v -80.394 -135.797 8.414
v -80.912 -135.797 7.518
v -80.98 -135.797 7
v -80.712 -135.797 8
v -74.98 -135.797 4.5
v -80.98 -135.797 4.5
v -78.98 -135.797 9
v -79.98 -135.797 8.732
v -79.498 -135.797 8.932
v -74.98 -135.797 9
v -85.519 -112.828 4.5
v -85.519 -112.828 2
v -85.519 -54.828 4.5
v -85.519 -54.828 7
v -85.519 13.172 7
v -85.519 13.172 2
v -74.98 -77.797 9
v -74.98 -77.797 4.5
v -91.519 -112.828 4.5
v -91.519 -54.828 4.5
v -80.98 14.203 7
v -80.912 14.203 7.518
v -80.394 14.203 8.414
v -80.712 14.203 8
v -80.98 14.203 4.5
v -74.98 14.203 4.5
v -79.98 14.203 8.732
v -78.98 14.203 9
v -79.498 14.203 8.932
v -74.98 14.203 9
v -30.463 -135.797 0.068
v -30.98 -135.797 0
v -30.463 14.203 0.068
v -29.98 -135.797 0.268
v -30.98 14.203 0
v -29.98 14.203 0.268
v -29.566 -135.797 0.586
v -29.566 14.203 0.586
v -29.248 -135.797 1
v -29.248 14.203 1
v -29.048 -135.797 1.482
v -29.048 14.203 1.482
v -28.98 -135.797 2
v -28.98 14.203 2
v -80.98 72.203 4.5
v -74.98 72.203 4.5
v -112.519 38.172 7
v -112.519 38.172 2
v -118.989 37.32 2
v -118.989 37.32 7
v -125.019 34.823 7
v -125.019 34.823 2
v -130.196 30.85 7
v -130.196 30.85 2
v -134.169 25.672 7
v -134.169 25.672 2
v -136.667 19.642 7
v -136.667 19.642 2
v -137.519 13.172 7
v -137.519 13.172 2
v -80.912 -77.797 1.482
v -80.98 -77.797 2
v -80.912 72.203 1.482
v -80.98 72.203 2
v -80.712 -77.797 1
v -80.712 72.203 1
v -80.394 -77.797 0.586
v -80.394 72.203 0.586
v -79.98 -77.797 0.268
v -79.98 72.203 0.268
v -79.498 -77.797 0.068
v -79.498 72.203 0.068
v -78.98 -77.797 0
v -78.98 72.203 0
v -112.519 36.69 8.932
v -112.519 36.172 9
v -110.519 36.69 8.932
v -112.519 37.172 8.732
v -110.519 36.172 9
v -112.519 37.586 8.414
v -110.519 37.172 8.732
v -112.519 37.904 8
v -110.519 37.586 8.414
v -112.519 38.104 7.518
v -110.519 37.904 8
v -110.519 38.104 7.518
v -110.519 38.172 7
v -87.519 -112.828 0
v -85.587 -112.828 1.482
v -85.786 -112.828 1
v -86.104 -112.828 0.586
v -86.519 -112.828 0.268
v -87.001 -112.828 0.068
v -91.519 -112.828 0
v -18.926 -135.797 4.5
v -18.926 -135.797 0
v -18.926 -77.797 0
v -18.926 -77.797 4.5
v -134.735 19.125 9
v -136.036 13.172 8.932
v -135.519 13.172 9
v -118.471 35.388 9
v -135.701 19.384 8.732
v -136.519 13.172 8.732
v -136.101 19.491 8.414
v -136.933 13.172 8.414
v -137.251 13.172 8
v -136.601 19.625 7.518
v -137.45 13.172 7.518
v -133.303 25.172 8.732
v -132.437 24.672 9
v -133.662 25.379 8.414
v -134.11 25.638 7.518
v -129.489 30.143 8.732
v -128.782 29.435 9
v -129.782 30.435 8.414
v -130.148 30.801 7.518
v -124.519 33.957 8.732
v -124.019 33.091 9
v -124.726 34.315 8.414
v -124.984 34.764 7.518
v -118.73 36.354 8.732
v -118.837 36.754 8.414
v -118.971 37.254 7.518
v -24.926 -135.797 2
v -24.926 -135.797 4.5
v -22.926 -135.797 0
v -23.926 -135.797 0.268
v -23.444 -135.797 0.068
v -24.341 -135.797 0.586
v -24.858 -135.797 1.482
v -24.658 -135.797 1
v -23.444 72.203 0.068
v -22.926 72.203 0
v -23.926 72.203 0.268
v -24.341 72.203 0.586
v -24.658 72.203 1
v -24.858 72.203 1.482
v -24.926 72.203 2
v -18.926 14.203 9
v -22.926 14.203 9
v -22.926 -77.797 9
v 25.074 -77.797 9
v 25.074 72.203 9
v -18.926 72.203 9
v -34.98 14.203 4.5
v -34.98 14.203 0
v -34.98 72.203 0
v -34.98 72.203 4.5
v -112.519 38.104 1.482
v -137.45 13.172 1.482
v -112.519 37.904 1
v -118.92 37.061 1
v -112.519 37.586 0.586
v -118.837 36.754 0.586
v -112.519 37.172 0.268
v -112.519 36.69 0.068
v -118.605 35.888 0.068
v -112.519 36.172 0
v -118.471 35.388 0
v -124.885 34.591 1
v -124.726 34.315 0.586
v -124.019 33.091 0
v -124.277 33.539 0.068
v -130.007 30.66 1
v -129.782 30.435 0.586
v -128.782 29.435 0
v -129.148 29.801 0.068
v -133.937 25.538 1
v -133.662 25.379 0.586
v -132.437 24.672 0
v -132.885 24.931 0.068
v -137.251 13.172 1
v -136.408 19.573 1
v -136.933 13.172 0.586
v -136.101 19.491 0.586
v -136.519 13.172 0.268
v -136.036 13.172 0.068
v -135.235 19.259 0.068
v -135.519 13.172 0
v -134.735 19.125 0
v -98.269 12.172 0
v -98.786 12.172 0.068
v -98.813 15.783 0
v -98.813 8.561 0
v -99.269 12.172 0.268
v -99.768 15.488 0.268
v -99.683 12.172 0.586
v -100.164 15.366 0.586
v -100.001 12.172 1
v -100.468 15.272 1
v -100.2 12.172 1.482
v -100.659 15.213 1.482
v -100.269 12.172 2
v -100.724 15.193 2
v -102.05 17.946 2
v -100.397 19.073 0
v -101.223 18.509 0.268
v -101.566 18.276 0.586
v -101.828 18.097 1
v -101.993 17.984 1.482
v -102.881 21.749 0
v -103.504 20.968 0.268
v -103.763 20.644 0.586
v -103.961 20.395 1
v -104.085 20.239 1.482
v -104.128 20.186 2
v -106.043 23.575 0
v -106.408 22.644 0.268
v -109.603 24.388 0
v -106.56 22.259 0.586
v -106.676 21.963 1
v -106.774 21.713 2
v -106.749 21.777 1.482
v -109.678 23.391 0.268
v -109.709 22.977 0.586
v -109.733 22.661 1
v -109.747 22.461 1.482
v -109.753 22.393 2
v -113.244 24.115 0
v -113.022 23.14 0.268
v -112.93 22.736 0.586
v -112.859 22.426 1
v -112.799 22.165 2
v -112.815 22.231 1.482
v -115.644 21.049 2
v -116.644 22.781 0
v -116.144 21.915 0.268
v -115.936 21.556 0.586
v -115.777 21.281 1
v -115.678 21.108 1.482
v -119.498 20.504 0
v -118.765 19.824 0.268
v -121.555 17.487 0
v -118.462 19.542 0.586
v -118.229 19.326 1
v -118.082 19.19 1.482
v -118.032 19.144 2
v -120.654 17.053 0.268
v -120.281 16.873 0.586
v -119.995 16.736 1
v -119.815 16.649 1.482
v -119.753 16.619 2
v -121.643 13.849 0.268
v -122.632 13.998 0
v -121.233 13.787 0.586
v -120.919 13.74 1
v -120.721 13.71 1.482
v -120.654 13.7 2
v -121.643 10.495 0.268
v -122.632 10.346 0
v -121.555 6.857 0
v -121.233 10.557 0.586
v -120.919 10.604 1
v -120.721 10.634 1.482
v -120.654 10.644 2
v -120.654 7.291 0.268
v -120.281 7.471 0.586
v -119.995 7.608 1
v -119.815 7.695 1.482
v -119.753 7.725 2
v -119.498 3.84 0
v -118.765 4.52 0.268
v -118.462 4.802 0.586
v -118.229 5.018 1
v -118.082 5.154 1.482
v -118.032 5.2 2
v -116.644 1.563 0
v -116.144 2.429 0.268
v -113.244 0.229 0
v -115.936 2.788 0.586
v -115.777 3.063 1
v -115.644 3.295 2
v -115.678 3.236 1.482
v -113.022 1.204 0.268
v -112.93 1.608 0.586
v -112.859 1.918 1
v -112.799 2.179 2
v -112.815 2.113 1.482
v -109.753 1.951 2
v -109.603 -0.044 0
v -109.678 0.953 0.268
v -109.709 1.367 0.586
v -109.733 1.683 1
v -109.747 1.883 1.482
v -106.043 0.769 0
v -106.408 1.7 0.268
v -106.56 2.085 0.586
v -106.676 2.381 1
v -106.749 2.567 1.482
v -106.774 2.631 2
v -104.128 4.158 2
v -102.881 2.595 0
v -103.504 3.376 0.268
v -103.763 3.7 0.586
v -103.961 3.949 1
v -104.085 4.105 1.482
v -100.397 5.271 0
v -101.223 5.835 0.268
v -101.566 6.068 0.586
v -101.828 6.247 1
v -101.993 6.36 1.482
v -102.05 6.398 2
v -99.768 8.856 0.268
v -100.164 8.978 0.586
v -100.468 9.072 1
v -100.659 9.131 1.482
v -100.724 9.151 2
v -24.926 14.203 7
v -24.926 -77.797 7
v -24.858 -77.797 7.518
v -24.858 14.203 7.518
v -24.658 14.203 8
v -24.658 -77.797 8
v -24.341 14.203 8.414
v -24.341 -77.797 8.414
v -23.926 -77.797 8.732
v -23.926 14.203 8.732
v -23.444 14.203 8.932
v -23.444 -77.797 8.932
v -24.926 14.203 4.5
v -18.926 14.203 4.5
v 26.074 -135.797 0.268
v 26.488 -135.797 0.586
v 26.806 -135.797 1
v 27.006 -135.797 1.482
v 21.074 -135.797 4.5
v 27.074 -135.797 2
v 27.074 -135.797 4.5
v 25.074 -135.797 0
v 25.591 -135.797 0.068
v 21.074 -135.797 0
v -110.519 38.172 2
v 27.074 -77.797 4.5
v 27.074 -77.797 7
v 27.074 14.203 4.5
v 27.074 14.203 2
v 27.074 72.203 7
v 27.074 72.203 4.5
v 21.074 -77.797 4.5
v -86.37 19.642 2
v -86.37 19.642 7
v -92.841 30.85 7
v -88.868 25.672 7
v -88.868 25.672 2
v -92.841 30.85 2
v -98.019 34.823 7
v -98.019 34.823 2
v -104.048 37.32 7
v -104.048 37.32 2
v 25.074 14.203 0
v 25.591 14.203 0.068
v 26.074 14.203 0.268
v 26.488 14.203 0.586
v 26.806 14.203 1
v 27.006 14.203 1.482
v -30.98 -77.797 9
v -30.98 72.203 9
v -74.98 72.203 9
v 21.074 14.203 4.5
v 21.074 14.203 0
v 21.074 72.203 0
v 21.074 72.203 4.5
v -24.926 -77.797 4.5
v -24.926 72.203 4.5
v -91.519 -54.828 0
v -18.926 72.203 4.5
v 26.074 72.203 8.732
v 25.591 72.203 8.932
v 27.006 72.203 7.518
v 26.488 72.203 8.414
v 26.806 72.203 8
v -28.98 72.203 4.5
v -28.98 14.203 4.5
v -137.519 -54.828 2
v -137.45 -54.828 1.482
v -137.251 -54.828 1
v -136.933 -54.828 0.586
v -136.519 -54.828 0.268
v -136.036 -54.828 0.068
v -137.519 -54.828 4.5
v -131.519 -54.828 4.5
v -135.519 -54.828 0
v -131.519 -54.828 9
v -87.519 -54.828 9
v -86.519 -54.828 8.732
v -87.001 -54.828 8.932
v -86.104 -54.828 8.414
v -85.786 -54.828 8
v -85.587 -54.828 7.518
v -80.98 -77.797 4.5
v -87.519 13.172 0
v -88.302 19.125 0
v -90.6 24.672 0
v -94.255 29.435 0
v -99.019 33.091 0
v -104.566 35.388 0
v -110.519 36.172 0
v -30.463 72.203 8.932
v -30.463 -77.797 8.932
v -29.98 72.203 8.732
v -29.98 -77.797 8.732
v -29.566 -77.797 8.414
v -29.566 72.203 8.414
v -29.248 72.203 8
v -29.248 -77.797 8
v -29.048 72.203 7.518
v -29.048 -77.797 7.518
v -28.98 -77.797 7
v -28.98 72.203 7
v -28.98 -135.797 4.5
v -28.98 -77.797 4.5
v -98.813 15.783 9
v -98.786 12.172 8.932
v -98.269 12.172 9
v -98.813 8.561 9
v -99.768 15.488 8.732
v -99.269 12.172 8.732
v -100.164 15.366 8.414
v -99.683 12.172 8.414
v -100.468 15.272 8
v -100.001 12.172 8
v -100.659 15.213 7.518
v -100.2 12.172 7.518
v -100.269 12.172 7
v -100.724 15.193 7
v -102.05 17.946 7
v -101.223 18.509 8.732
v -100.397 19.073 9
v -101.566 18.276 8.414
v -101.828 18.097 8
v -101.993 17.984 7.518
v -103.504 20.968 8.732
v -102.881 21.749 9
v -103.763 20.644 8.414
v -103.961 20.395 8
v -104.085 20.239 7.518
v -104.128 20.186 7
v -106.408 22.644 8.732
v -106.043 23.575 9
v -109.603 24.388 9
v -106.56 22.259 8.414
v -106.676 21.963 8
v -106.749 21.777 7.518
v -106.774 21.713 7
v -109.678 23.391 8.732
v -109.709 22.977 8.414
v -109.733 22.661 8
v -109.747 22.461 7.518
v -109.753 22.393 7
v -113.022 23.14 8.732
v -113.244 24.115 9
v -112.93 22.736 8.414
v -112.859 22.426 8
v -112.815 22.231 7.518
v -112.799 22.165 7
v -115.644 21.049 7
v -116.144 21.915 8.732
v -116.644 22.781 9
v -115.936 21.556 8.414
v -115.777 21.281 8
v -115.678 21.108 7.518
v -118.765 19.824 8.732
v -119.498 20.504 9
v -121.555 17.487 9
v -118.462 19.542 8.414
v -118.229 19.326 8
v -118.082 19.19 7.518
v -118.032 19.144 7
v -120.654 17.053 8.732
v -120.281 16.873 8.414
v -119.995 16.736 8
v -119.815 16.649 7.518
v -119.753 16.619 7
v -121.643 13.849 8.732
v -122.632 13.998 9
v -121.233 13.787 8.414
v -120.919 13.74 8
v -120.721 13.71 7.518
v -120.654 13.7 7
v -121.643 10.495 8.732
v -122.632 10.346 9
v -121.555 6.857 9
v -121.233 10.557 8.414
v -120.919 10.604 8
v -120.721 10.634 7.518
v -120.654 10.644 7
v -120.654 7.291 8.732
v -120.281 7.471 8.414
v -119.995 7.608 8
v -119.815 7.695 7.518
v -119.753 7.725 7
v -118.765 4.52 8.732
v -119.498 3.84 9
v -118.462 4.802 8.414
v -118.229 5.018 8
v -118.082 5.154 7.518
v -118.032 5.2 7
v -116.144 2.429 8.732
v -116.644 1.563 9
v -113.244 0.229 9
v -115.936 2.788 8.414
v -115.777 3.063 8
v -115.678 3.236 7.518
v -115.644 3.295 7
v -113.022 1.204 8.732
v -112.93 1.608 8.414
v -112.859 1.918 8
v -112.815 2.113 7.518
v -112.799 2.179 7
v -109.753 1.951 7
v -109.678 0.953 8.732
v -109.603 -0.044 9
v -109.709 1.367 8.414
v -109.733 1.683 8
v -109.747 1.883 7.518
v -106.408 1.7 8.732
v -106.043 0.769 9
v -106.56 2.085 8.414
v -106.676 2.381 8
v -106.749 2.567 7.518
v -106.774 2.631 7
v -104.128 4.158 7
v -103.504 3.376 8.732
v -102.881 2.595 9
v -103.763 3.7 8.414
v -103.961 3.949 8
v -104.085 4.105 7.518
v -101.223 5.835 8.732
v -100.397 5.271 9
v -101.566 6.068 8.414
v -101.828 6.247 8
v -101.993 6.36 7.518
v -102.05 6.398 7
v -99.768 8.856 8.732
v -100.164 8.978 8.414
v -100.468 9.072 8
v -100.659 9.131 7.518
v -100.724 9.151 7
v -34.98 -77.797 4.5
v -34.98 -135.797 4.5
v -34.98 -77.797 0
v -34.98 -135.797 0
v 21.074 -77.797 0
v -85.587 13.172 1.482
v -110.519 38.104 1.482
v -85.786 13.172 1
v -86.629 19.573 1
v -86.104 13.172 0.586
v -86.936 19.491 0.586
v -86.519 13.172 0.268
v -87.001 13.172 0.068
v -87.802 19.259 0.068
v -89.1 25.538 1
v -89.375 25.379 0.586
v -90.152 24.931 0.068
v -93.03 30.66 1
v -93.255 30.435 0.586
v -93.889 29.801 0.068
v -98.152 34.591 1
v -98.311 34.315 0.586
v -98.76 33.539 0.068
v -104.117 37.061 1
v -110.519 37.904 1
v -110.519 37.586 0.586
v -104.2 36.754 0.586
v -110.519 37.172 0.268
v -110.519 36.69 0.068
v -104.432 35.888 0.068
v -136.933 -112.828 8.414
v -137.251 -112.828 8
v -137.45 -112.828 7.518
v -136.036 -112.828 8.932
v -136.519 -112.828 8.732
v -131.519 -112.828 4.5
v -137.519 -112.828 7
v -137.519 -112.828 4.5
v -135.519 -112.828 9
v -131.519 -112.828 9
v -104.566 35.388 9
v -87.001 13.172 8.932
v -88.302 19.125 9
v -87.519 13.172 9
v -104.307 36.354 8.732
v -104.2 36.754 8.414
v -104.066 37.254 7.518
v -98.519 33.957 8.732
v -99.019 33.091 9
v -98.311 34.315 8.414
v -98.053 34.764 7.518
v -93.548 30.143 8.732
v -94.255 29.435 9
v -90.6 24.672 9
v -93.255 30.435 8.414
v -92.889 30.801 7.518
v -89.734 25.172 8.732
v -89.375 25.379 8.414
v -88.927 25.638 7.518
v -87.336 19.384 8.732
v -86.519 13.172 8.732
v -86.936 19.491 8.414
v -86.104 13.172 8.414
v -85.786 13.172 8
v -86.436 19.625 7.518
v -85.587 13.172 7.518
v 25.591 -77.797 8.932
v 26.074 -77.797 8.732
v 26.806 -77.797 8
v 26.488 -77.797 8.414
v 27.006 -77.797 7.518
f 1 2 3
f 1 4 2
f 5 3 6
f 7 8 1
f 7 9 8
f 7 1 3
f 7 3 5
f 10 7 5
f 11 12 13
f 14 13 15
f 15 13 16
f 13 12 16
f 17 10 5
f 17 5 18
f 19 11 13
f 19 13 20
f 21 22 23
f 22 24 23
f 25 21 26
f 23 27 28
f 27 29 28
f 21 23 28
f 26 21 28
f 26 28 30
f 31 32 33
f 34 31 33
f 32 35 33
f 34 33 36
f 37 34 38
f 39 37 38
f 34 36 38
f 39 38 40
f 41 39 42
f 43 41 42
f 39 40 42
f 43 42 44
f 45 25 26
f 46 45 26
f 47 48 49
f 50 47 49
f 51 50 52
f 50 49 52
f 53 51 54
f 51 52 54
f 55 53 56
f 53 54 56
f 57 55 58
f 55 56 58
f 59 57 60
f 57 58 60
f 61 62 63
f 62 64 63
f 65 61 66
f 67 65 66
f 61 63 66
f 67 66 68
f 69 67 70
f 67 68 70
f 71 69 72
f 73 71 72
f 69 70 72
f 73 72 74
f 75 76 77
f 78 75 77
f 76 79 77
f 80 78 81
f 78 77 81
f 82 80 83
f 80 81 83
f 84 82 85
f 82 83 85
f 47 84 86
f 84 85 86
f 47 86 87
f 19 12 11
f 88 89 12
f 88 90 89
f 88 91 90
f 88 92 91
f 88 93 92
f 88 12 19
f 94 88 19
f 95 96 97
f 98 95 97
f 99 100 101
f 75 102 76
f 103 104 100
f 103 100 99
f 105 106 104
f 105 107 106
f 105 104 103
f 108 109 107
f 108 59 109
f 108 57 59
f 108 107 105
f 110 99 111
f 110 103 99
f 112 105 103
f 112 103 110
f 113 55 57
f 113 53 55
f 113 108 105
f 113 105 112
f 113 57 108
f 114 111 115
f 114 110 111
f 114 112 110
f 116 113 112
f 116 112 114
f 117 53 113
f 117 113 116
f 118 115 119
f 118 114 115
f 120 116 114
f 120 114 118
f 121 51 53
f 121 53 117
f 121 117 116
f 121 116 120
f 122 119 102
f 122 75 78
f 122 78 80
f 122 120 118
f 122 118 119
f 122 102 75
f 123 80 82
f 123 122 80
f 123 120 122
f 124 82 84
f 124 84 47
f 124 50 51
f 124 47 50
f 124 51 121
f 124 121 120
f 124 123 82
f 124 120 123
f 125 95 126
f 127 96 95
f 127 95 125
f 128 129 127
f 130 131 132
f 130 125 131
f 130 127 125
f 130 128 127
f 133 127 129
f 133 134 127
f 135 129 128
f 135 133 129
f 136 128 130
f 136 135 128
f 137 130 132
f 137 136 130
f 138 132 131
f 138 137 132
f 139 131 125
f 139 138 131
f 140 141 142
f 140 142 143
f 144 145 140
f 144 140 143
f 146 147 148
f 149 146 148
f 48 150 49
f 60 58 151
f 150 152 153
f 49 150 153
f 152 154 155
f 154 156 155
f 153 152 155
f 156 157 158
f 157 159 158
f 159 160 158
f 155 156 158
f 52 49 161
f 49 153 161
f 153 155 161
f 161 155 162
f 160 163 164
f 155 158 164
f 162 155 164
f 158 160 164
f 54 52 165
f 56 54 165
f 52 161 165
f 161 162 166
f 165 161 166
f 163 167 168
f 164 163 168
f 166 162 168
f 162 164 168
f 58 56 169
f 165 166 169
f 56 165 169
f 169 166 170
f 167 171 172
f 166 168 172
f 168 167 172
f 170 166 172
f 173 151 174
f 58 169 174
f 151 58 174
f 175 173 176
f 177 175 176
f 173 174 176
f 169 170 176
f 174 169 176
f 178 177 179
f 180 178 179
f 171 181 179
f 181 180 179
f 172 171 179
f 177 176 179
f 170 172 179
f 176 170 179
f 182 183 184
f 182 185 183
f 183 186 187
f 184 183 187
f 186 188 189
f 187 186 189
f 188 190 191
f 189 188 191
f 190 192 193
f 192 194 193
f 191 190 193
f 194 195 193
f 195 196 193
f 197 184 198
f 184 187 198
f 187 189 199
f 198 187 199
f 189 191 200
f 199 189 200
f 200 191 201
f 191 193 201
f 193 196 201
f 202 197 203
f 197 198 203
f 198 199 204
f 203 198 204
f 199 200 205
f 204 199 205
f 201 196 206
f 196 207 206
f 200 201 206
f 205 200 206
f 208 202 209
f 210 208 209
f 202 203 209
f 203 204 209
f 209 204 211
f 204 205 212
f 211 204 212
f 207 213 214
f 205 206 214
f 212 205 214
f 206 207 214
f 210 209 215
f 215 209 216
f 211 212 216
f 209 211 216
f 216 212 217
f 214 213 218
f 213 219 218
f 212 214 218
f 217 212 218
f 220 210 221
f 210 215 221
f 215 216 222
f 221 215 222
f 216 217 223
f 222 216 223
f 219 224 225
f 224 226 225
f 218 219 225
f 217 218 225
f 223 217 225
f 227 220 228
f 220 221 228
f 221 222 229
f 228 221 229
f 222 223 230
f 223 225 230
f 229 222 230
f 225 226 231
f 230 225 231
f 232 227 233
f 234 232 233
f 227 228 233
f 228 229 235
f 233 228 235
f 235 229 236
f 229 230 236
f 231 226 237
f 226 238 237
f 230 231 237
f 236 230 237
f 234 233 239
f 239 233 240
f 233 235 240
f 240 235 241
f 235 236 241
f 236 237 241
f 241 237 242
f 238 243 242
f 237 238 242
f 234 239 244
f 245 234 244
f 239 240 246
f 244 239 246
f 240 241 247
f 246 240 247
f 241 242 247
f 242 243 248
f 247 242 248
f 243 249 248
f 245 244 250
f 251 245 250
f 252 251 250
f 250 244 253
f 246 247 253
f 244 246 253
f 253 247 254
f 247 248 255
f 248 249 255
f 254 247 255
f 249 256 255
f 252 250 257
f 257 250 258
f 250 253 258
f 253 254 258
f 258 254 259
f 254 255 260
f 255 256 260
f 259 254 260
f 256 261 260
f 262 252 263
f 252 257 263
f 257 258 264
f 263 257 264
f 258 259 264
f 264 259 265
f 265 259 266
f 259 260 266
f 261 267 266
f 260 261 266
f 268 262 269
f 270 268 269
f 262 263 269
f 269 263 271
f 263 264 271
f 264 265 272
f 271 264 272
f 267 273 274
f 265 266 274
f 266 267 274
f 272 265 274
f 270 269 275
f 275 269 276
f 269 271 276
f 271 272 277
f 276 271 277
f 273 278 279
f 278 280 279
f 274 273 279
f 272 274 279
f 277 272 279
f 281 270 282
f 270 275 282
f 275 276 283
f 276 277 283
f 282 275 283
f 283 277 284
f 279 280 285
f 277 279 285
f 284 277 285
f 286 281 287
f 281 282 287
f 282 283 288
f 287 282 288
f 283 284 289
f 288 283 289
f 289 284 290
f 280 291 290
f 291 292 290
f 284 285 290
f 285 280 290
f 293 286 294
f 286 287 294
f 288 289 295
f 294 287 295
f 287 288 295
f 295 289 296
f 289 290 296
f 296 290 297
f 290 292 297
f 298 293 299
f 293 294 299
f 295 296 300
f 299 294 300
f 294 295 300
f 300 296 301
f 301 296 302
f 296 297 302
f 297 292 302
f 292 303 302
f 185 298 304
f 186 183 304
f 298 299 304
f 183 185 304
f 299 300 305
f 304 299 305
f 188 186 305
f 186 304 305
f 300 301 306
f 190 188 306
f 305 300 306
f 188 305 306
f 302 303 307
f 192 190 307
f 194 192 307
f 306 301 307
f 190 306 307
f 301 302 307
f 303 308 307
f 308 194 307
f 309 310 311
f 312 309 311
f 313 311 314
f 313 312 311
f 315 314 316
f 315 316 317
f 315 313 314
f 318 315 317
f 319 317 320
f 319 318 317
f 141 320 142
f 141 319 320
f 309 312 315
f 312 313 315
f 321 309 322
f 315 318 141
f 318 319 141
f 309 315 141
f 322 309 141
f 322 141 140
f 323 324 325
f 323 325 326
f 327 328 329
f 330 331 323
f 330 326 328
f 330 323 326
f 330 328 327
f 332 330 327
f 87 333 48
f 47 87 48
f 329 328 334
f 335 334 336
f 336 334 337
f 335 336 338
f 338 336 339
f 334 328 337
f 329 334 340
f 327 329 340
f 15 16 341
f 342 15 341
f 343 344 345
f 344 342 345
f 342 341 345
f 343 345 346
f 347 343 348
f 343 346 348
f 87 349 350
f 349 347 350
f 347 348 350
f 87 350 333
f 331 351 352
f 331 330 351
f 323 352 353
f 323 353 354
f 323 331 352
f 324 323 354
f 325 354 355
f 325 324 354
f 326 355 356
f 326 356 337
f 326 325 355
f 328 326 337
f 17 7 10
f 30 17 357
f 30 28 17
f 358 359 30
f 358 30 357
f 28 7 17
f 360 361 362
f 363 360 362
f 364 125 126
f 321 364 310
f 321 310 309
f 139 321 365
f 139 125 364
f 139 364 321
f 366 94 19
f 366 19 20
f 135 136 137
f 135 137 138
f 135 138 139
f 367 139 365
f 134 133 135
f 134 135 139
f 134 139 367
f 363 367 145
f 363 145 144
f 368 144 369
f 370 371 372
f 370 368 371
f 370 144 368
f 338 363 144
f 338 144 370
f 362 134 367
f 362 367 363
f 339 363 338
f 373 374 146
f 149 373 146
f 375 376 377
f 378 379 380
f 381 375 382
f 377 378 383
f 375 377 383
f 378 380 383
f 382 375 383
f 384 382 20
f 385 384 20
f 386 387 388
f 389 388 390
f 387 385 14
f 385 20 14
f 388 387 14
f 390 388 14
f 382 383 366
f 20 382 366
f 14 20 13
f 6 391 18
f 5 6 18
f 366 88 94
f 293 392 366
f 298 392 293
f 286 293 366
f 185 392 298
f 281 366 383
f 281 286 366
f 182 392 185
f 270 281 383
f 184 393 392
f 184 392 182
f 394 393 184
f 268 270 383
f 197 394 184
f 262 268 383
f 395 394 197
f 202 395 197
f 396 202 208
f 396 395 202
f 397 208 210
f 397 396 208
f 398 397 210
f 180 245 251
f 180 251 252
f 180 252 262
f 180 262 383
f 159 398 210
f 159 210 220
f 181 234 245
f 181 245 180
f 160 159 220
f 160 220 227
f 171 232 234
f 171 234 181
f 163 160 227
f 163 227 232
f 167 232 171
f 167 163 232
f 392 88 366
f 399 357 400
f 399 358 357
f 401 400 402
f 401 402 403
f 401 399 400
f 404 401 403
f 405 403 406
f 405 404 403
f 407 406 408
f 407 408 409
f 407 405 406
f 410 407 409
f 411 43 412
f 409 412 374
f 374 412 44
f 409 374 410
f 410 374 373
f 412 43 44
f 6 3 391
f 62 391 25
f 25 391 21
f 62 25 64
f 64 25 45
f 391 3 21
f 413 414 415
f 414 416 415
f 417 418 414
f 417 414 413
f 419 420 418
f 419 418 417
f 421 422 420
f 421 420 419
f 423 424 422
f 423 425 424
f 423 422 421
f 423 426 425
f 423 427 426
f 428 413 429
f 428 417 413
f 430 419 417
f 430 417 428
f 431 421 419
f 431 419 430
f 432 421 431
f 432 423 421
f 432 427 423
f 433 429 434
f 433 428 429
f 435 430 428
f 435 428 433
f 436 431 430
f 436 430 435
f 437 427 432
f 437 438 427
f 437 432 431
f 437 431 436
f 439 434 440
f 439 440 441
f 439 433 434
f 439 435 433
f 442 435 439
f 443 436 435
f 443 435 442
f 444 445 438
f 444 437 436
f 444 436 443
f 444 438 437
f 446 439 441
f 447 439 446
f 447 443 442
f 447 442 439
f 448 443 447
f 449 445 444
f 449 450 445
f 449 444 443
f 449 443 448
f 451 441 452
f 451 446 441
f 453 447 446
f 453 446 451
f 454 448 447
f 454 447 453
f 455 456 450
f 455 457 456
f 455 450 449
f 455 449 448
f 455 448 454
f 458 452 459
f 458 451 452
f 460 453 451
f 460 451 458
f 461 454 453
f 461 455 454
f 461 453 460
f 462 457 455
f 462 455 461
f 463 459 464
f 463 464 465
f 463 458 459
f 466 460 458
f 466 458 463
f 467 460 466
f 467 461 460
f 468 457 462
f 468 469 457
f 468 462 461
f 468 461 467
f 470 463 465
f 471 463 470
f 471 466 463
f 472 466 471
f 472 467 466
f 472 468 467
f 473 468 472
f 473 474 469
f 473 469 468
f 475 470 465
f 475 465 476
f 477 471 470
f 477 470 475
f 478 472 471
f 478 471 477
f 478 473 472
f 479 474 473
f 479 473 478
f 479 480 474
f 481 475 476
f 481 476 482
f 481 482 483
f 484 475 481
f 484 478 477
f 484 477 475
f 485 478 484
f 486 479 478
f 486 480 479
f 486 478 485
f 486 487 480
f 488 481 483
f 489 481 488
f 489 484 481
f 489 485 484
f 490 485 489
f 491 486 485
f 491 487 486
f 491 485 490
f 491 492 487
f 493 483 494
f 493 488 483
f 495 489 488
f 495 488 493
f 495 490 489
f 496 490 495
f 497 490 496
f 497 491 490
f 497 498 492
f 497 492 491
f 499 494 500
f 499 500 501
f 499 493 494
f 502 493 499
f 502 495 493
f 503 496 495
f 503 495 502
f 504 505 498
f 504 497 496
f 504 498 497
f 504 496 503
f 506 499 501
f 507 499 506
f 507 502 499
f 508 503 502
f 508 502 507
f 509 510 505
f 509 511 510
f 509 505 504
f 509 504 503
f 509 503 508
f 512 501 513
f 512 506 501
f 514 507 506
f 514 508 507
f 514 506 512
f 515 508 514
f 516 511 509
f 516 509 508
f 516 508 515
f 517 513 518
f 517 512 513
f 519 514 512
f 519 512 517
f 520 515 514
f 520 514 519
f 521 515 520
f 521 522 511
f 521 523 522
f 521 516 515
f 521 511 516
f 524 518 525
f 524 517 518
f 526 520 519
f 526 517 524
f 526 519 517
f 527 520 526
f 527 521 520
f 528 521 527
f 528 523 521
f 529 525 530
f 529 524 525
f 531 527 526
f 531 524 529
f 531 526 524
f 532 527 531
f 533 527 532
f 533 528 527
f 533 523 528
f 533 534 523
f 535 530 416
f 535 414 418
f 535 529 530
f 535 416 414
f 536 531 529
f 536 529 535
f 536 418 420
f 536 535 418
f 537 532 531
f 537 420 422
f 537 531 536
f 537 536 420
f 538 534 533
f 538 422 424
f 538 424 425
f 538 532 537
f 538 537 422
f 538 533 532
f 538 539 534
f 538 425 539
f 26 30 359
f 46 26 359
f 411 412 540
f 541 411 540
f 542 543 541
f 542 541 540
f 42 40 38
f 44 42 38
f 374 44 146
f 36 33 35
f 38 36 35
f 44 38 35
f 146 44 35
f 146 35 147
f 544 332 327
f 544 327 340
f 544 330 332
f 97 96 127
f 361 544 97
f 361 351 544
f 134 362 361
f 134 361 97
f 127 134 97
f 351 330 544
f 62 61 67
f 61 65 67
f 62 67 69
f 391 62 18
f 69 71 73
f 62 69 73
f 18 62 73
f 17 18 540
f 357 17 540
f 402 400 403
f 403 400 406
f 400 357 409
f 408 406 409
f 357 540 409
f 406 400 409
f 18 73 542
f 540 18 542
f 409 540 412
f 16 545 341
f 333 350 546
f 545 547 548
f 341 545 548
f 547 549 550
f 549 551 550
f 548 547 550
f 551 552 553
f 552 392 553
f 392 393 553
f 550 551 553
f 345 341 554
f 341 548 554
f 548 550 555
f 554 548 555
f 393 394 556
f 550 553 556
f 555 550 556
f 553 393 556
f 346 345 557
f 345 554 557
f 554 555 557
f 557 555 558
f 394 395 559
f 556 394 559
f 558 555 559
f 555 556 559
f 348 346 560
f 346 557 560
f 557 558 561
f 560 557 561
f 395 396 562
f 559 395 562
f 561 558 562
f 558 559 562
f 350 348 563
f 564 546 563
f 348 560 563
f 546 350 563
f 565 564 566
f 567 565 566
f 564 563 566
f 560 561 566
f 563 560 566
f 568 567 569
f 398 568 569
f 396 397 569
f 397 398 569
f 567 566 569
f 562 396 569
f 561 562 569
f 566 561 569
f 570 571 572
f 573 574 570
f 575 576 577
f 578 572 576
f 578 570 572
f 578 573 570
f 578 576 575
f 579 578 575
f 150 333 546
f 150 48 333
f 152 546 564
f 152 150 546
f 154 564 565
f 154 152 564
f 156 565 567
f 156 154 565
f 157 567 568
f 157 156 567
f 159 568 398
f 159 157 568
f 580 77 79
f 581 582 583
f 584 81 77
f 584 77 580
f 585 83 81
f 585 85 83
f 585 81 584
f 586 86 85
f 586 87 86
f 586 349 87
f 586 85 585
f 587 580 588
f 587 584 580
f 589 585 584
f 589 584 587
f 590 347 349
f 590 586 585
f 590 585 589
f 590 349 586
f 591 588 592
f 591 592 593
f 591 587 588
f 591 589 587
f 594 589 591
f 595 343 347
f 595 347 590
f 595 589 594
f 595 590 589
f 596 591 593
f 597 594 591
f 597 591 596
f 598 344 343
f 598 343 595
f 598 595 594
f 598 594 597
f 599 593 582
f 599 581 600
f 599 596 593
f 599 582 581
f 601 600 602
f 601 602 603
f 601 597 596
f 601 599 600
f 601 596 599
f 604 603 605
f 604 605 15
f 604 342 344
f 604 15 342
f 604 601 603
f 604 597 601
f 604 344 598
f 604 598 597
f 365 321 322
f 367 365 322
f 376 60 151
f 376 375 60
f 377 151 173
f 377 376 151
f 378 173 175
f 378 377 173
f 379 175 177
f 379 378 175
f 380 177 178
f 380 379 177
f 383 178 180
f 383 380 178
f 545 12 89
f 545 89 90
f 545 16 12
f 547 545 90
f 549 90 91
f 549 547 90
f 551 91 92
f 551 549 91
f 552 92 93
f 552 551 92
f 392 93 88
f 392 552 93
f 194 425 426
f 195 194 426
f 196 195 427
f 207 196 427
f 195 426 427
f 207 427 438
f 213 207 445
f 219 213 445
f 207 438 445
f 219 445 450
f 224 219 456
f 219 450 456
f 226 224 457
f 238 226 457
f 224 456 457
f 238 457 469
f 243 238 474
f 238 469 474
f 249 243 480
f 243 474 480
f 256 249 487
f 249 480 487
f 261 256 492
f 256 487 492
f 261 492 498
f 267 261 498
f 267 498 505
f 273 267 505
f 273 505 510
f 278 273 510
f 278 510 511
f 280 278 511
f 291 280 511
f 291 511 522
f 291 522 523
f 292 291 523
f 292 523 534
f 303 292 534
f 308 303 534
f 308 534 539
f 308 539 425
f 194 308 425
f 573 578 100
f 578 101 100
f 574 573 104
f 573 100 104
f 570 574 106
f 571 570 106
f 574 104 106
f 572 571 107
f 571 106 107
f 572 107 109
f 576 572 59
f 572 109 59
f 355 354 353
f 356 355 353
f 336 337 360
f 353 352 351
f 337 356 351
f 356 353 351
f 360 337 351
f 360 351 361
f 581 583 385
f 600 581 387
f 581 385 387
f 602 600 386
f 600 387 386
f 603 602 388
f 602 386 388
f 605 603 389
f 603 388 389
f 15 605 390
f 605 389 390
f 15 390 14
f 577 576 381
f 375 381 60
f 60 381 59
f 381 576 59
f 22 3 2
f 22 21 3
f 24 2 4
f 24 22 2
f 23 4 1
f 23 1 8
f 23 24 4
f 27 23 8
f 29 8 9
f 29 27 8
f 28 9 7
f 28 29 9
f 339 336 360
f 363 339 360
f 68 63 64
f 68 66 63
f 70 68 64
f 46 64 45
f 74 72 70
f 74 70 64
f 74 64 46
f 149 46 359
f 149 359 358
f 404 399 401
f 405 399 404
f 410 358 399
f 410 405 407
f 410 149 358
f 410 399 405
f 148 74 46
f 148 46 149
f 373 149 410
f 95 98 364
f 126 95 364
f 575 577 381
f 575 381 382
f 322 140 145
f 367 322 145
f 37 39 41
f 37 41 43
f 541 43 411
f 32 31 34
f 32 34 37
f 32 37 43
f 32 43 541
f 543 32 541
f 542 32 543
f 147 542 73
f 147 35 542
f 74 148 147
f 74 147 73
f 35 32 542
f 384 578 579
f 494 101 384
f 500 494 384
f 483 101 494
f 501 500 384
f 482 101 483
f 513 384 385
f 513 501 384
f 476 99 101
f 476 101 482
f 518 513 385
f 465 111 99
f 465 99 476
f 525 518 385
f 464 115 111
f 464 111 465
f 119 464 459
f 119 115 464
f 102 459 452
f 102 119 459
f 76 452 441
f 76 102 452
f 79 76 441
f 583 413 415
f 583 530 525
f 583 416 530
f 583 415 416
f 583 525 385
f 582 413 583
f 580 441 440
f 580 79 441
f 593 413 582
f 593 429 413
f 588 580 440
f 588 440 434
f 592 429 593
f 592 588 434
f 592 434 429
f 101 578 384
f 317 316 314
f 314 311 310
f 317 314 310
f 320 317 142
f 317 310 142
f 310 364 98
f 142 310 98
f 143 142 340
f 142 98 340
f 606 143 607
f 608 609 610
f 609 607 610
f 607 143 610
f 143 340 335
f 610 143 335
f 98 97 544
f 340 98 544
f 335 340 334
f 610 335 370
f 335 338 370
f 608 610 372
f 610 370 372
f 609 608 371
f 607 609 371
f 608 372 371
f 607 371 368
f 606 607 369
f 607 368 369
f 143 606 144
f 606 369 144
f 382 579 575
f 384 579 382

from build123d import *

# Parameters (mm, degrees)
SKETCH2_W            = 52
SKETCH2_H            = 150
BOSS_EXTRUDE1_DEPTH  = 9
SKETCH3_W            = 52
SKETCH3_H            = 150
BOSS_EXTRUDE2_DEPTH  = 9
SKETCH5_W            = 6
SKETCH5_H            = 58
BOSS_EXTRUDE3_DEPTH  = 4.5
SKETCH7_W            = 6
SKETCH7_H            = 58
CUT_EXTRUDE1_DEPTH   = 4.5
SKETCH8_W            = 6
SKETCH8_H            = 58
CUT_EXTRUDE2_DEPTH   = 4.5
SKETCH9_W            = 6
SKETCH9_H            = 58
BOSS_EXTRUDE4_DEPTH  = 4.5
SKETCH10_W           = 6
SKETCH10_H           = 58
BOSS_EXTRUDE5_DEPTH  = 4.5
BOSS_EXTRUDE8_DEPTH  = 9
SKETCH13_W           = 6
SKETCH13_H           = 58
CUT_EXTRUDE3_DEPTH   = 4.5
SKETCH14_W           = 6
SKETCH14_H           = 58
CUT_EXTRUDE4_DEPTH   = 4.5
SKETCH15_W           = 6
SKETCH15_H           = 58
BOSS_EXTRUDE9_DEPTH  = 4.5
SKETCH16_W           = 6
SKETCH16_H           = 58
BOSS_EXTRUDE10_DEPTH = 4.5
SKETCH17_R           = 10.25
CUT_EXTRUDE5_DEPTH   = 13.5
FILLET1_R            = 2
FILLET2_R            = 2
FILLET3_R            = 2


with BuildPart() as part:
    # Sketch2 → Boss-Extrude1 (new body)
    with BuildSketch(Plane.XY):
        with Locations((-54.980202323, -2.796759356)):
            Rectangle(SKETCH2_W, SKETCH2_H)
    extrude(amount=BOSS_EXTRUDE1_DEPTH)

    # Sketch9 → Boss-Extrude4 (add)
    with BuildSketch(Plane(origin=(0, 0, 0), x_dir=(-1, 0, 0), z_dir=(0, 0, -1))):
        with Locations((31.980202323, -106.796759356)):
            Rectangle(SKETCH9_W, SKETCH9_H)
    extrude(amount=-BOSS_EXTRUDE4_DEPTH)

    # Sketch10 → Boss-Extrude5 (add)
    with BuildSketch(Plane.XY.offset(9)):
        with Locations((-77.980202323, -106.796759356)):
            Rectangle(SKETCH10_W, SKETCH10_H)
    extrude(amount=-BOSS_EXTRUDE5_DEPTH)

    # Sketch13 → Cut-Extrude3 (cut)
    with BuildSketch(Plane(origin=(0, 0, 0), x_dir=(-1, 0, 0), z_dir=(0, 0, -1))):
        with Locations((31.980202323, 43.203240644)):
            Rectangle(SKETCH13_W, SKETCH13_H)
    extrude(amount=-CUT_EXTRUDE3_DEPTH, mode=Mode.SUBTRACT)

    # Sketch14 → Cut-Extrude4 (cut)
    with BuildSketch(Plane.XY.offset(9)):
        with Locations((-77.980202323, 43.203240644)):
            Rectangle(SKETCH14_W, SKETCH14_H)
    extrude(amount=-CUT_EXTRUDE4_DEPTH, mode=Mode.SUBTRACT)

    # Fillet2
    fillet2_edges = [part.edges().sort_by_distance(p)[0] for p in [
        (-28.980202323, -2.796759356, 9),
        (-80.980202323, -2.796759356, 0),
        (-80.980202323, -60.796759356, 9),
        (-28.980202323, -60.796759356, 0),
    ]]
    fillet(fillet2_edges, radius=FILLET2_R)


with BuildPart() as body_2:
    # Sketch3 → Boss-Extrude2 (new body)
    with BuildSketch(Plane.XY):
        with Locations((1.073700091, -2.796759356)):
            Rectangle(SKETCH3_W, SKETCH3_H)
    extrude(amount=BOSS_EXTRUDE2_DEPTH)

    # Sketch5 → Boss-Extrude3 (add)
    with BuildSketch(Plane(origin=(0, 0, 0), x_dir=(-1, 0, 0), z_dir=(0, 0, -1))):
        with Locations((21.926299909, -106.796759356)):
            Rectangle(SKETCH5_W, SKETCH5_H)
        with Locations((-24.073700091, -106.796759356)):
            Rectangle(SKETCH5_W, SKETCH5_H)
    extrude(amount=-BOSS_EXTRUDE3_DEPTH)

    # Sketch7 → Cut-Extrude1 (cut)
    with BuildSketch(Plane(origin=(0, 0, 0), x_dir=(-1, 0, 0), z_dir=(0, 0, -1))):
        with Locations((-24.073700091, 43.203240644)):
            Rectangle(SKETCH7_W, SKETCH7_H)
    extrude(amount=-CUT_EXTRUDE1_DEPTH, mode=Mode.SUBTRACT)

    # Sketch8 → Cut-Extrude2 (cut)
    with BuildSketch(Plane.XY.offset(9)):
        with Locations((-21.926299909, 43.203240644)):
            Rectangle(SKETCH8_W, SKETCH8_H)
    extrude(amount=-CUT_EXTRUDE2_DEPTH, mode=Mode.SUBTRACT)

    # Fillet3
    fillet3_edges = [body_2.edges().sort_by_distance(p)[0] for p in [
        (27.073700091, -2.796759356, 9),
        (-24.926299909, -31.796759356, 0),
        (-24.926299909, -31.796759356, 9),
        (27.073700091, -60.796759356, 0),
    ]]
    fillet(fillet3_edges, radius=FILLET3_R)


with BuildPart() as body_3:
    # Sketch12 → Boss-Extrude8 (new body)
    with BuildSketch(Plane.XY):
        with BuildLine():
            Line((-110.518525137, 38.172007968), (-112.518525137, 38.172007968))
            ThreePointArc((-112.518525137, 38.172007968), (-130.196194666, 30.849677498), (-137.518525137, 13.172007968))
            Line((-137.518525137, 13.172007968), (-137.518525137, -54.827992032))
            Line((-137.518525137, -54.827992032), (-85.518525137, -54.827992032))
            Line((-85.518525137, -54.827992032), (-85.518525137, 13.172007968))
            ThreePointArc((-85.518525137, 13.172007968), (-92.840855607, 30.849677498), (-110.518525137, 38.172007968))
        make_face()
    extrude(amount=BOSS_EXTRUDE8_DEPTH)

    # Sketch15 → Boss-Extrude9 (add)
    with BuildSketch(Plane.XY.offset(9)):
        with Locations((-134.518525137, -83.827992032)):
            Rectangle(SKETCH15_W, SKETCH15_H)
    extrude(amount=-BOSS_EXTRUDE9_DEPTH)

    # Sketch16 → Boss-Extrude10 (add)
    with BuildSketch(Plane(origin=(0, 0, 0), x_dir=(-1, 0, 0), z_dir=(0, 0, -1))):
        with Locations((88.518525137, -83.827992032)):
            Rectangle(SKETCH16_W, SKETCH16_H)
    extrude(amount=-BOSS_EXTRUDE10_DEPTH)

    # Sketch17 → Cut-Extrude5 (cut)
    with BuildSketch(Plane.XY.offset(9)):
        with Locations((-110.518525137, 12.172007968)):
            Circle(SKETCH17_R)
    extrude(amount=-CUT_EXTRUDE5_DEPTH, mode=Mode.SUBTRACT)

    # Fillet1
    fillet1_edges = [body_3.edges().sort_by_distance(p)[0] for p in [
        (-137.518525137, -49.827992032, 9),
        (-85.518525137, -20.827992032, 9),
        (-92.840855607, 30.849677498, 9),
        (-120.768525137, 12.172007968, 0),
        (-111.518525137, 38.172007968, 9),
        (-120.768525137, 12.172007968, 9),
        (-92.840855607, 30.849677498, 0),
        (-85.518525137, -49.827992032, 0),
        (-137.518525137, -20.827992032, 0),
        (-130.196194666, 30.849677498, 0),
        (-111.518525137, 38.172007968, 0),
        (-130.196194666, 30.849677498, 9),
    ]]
    fillet(fillet1_edges, radius=FILLET1_R)


solid = Compound([part.part, body_2.part, body_3.part])
